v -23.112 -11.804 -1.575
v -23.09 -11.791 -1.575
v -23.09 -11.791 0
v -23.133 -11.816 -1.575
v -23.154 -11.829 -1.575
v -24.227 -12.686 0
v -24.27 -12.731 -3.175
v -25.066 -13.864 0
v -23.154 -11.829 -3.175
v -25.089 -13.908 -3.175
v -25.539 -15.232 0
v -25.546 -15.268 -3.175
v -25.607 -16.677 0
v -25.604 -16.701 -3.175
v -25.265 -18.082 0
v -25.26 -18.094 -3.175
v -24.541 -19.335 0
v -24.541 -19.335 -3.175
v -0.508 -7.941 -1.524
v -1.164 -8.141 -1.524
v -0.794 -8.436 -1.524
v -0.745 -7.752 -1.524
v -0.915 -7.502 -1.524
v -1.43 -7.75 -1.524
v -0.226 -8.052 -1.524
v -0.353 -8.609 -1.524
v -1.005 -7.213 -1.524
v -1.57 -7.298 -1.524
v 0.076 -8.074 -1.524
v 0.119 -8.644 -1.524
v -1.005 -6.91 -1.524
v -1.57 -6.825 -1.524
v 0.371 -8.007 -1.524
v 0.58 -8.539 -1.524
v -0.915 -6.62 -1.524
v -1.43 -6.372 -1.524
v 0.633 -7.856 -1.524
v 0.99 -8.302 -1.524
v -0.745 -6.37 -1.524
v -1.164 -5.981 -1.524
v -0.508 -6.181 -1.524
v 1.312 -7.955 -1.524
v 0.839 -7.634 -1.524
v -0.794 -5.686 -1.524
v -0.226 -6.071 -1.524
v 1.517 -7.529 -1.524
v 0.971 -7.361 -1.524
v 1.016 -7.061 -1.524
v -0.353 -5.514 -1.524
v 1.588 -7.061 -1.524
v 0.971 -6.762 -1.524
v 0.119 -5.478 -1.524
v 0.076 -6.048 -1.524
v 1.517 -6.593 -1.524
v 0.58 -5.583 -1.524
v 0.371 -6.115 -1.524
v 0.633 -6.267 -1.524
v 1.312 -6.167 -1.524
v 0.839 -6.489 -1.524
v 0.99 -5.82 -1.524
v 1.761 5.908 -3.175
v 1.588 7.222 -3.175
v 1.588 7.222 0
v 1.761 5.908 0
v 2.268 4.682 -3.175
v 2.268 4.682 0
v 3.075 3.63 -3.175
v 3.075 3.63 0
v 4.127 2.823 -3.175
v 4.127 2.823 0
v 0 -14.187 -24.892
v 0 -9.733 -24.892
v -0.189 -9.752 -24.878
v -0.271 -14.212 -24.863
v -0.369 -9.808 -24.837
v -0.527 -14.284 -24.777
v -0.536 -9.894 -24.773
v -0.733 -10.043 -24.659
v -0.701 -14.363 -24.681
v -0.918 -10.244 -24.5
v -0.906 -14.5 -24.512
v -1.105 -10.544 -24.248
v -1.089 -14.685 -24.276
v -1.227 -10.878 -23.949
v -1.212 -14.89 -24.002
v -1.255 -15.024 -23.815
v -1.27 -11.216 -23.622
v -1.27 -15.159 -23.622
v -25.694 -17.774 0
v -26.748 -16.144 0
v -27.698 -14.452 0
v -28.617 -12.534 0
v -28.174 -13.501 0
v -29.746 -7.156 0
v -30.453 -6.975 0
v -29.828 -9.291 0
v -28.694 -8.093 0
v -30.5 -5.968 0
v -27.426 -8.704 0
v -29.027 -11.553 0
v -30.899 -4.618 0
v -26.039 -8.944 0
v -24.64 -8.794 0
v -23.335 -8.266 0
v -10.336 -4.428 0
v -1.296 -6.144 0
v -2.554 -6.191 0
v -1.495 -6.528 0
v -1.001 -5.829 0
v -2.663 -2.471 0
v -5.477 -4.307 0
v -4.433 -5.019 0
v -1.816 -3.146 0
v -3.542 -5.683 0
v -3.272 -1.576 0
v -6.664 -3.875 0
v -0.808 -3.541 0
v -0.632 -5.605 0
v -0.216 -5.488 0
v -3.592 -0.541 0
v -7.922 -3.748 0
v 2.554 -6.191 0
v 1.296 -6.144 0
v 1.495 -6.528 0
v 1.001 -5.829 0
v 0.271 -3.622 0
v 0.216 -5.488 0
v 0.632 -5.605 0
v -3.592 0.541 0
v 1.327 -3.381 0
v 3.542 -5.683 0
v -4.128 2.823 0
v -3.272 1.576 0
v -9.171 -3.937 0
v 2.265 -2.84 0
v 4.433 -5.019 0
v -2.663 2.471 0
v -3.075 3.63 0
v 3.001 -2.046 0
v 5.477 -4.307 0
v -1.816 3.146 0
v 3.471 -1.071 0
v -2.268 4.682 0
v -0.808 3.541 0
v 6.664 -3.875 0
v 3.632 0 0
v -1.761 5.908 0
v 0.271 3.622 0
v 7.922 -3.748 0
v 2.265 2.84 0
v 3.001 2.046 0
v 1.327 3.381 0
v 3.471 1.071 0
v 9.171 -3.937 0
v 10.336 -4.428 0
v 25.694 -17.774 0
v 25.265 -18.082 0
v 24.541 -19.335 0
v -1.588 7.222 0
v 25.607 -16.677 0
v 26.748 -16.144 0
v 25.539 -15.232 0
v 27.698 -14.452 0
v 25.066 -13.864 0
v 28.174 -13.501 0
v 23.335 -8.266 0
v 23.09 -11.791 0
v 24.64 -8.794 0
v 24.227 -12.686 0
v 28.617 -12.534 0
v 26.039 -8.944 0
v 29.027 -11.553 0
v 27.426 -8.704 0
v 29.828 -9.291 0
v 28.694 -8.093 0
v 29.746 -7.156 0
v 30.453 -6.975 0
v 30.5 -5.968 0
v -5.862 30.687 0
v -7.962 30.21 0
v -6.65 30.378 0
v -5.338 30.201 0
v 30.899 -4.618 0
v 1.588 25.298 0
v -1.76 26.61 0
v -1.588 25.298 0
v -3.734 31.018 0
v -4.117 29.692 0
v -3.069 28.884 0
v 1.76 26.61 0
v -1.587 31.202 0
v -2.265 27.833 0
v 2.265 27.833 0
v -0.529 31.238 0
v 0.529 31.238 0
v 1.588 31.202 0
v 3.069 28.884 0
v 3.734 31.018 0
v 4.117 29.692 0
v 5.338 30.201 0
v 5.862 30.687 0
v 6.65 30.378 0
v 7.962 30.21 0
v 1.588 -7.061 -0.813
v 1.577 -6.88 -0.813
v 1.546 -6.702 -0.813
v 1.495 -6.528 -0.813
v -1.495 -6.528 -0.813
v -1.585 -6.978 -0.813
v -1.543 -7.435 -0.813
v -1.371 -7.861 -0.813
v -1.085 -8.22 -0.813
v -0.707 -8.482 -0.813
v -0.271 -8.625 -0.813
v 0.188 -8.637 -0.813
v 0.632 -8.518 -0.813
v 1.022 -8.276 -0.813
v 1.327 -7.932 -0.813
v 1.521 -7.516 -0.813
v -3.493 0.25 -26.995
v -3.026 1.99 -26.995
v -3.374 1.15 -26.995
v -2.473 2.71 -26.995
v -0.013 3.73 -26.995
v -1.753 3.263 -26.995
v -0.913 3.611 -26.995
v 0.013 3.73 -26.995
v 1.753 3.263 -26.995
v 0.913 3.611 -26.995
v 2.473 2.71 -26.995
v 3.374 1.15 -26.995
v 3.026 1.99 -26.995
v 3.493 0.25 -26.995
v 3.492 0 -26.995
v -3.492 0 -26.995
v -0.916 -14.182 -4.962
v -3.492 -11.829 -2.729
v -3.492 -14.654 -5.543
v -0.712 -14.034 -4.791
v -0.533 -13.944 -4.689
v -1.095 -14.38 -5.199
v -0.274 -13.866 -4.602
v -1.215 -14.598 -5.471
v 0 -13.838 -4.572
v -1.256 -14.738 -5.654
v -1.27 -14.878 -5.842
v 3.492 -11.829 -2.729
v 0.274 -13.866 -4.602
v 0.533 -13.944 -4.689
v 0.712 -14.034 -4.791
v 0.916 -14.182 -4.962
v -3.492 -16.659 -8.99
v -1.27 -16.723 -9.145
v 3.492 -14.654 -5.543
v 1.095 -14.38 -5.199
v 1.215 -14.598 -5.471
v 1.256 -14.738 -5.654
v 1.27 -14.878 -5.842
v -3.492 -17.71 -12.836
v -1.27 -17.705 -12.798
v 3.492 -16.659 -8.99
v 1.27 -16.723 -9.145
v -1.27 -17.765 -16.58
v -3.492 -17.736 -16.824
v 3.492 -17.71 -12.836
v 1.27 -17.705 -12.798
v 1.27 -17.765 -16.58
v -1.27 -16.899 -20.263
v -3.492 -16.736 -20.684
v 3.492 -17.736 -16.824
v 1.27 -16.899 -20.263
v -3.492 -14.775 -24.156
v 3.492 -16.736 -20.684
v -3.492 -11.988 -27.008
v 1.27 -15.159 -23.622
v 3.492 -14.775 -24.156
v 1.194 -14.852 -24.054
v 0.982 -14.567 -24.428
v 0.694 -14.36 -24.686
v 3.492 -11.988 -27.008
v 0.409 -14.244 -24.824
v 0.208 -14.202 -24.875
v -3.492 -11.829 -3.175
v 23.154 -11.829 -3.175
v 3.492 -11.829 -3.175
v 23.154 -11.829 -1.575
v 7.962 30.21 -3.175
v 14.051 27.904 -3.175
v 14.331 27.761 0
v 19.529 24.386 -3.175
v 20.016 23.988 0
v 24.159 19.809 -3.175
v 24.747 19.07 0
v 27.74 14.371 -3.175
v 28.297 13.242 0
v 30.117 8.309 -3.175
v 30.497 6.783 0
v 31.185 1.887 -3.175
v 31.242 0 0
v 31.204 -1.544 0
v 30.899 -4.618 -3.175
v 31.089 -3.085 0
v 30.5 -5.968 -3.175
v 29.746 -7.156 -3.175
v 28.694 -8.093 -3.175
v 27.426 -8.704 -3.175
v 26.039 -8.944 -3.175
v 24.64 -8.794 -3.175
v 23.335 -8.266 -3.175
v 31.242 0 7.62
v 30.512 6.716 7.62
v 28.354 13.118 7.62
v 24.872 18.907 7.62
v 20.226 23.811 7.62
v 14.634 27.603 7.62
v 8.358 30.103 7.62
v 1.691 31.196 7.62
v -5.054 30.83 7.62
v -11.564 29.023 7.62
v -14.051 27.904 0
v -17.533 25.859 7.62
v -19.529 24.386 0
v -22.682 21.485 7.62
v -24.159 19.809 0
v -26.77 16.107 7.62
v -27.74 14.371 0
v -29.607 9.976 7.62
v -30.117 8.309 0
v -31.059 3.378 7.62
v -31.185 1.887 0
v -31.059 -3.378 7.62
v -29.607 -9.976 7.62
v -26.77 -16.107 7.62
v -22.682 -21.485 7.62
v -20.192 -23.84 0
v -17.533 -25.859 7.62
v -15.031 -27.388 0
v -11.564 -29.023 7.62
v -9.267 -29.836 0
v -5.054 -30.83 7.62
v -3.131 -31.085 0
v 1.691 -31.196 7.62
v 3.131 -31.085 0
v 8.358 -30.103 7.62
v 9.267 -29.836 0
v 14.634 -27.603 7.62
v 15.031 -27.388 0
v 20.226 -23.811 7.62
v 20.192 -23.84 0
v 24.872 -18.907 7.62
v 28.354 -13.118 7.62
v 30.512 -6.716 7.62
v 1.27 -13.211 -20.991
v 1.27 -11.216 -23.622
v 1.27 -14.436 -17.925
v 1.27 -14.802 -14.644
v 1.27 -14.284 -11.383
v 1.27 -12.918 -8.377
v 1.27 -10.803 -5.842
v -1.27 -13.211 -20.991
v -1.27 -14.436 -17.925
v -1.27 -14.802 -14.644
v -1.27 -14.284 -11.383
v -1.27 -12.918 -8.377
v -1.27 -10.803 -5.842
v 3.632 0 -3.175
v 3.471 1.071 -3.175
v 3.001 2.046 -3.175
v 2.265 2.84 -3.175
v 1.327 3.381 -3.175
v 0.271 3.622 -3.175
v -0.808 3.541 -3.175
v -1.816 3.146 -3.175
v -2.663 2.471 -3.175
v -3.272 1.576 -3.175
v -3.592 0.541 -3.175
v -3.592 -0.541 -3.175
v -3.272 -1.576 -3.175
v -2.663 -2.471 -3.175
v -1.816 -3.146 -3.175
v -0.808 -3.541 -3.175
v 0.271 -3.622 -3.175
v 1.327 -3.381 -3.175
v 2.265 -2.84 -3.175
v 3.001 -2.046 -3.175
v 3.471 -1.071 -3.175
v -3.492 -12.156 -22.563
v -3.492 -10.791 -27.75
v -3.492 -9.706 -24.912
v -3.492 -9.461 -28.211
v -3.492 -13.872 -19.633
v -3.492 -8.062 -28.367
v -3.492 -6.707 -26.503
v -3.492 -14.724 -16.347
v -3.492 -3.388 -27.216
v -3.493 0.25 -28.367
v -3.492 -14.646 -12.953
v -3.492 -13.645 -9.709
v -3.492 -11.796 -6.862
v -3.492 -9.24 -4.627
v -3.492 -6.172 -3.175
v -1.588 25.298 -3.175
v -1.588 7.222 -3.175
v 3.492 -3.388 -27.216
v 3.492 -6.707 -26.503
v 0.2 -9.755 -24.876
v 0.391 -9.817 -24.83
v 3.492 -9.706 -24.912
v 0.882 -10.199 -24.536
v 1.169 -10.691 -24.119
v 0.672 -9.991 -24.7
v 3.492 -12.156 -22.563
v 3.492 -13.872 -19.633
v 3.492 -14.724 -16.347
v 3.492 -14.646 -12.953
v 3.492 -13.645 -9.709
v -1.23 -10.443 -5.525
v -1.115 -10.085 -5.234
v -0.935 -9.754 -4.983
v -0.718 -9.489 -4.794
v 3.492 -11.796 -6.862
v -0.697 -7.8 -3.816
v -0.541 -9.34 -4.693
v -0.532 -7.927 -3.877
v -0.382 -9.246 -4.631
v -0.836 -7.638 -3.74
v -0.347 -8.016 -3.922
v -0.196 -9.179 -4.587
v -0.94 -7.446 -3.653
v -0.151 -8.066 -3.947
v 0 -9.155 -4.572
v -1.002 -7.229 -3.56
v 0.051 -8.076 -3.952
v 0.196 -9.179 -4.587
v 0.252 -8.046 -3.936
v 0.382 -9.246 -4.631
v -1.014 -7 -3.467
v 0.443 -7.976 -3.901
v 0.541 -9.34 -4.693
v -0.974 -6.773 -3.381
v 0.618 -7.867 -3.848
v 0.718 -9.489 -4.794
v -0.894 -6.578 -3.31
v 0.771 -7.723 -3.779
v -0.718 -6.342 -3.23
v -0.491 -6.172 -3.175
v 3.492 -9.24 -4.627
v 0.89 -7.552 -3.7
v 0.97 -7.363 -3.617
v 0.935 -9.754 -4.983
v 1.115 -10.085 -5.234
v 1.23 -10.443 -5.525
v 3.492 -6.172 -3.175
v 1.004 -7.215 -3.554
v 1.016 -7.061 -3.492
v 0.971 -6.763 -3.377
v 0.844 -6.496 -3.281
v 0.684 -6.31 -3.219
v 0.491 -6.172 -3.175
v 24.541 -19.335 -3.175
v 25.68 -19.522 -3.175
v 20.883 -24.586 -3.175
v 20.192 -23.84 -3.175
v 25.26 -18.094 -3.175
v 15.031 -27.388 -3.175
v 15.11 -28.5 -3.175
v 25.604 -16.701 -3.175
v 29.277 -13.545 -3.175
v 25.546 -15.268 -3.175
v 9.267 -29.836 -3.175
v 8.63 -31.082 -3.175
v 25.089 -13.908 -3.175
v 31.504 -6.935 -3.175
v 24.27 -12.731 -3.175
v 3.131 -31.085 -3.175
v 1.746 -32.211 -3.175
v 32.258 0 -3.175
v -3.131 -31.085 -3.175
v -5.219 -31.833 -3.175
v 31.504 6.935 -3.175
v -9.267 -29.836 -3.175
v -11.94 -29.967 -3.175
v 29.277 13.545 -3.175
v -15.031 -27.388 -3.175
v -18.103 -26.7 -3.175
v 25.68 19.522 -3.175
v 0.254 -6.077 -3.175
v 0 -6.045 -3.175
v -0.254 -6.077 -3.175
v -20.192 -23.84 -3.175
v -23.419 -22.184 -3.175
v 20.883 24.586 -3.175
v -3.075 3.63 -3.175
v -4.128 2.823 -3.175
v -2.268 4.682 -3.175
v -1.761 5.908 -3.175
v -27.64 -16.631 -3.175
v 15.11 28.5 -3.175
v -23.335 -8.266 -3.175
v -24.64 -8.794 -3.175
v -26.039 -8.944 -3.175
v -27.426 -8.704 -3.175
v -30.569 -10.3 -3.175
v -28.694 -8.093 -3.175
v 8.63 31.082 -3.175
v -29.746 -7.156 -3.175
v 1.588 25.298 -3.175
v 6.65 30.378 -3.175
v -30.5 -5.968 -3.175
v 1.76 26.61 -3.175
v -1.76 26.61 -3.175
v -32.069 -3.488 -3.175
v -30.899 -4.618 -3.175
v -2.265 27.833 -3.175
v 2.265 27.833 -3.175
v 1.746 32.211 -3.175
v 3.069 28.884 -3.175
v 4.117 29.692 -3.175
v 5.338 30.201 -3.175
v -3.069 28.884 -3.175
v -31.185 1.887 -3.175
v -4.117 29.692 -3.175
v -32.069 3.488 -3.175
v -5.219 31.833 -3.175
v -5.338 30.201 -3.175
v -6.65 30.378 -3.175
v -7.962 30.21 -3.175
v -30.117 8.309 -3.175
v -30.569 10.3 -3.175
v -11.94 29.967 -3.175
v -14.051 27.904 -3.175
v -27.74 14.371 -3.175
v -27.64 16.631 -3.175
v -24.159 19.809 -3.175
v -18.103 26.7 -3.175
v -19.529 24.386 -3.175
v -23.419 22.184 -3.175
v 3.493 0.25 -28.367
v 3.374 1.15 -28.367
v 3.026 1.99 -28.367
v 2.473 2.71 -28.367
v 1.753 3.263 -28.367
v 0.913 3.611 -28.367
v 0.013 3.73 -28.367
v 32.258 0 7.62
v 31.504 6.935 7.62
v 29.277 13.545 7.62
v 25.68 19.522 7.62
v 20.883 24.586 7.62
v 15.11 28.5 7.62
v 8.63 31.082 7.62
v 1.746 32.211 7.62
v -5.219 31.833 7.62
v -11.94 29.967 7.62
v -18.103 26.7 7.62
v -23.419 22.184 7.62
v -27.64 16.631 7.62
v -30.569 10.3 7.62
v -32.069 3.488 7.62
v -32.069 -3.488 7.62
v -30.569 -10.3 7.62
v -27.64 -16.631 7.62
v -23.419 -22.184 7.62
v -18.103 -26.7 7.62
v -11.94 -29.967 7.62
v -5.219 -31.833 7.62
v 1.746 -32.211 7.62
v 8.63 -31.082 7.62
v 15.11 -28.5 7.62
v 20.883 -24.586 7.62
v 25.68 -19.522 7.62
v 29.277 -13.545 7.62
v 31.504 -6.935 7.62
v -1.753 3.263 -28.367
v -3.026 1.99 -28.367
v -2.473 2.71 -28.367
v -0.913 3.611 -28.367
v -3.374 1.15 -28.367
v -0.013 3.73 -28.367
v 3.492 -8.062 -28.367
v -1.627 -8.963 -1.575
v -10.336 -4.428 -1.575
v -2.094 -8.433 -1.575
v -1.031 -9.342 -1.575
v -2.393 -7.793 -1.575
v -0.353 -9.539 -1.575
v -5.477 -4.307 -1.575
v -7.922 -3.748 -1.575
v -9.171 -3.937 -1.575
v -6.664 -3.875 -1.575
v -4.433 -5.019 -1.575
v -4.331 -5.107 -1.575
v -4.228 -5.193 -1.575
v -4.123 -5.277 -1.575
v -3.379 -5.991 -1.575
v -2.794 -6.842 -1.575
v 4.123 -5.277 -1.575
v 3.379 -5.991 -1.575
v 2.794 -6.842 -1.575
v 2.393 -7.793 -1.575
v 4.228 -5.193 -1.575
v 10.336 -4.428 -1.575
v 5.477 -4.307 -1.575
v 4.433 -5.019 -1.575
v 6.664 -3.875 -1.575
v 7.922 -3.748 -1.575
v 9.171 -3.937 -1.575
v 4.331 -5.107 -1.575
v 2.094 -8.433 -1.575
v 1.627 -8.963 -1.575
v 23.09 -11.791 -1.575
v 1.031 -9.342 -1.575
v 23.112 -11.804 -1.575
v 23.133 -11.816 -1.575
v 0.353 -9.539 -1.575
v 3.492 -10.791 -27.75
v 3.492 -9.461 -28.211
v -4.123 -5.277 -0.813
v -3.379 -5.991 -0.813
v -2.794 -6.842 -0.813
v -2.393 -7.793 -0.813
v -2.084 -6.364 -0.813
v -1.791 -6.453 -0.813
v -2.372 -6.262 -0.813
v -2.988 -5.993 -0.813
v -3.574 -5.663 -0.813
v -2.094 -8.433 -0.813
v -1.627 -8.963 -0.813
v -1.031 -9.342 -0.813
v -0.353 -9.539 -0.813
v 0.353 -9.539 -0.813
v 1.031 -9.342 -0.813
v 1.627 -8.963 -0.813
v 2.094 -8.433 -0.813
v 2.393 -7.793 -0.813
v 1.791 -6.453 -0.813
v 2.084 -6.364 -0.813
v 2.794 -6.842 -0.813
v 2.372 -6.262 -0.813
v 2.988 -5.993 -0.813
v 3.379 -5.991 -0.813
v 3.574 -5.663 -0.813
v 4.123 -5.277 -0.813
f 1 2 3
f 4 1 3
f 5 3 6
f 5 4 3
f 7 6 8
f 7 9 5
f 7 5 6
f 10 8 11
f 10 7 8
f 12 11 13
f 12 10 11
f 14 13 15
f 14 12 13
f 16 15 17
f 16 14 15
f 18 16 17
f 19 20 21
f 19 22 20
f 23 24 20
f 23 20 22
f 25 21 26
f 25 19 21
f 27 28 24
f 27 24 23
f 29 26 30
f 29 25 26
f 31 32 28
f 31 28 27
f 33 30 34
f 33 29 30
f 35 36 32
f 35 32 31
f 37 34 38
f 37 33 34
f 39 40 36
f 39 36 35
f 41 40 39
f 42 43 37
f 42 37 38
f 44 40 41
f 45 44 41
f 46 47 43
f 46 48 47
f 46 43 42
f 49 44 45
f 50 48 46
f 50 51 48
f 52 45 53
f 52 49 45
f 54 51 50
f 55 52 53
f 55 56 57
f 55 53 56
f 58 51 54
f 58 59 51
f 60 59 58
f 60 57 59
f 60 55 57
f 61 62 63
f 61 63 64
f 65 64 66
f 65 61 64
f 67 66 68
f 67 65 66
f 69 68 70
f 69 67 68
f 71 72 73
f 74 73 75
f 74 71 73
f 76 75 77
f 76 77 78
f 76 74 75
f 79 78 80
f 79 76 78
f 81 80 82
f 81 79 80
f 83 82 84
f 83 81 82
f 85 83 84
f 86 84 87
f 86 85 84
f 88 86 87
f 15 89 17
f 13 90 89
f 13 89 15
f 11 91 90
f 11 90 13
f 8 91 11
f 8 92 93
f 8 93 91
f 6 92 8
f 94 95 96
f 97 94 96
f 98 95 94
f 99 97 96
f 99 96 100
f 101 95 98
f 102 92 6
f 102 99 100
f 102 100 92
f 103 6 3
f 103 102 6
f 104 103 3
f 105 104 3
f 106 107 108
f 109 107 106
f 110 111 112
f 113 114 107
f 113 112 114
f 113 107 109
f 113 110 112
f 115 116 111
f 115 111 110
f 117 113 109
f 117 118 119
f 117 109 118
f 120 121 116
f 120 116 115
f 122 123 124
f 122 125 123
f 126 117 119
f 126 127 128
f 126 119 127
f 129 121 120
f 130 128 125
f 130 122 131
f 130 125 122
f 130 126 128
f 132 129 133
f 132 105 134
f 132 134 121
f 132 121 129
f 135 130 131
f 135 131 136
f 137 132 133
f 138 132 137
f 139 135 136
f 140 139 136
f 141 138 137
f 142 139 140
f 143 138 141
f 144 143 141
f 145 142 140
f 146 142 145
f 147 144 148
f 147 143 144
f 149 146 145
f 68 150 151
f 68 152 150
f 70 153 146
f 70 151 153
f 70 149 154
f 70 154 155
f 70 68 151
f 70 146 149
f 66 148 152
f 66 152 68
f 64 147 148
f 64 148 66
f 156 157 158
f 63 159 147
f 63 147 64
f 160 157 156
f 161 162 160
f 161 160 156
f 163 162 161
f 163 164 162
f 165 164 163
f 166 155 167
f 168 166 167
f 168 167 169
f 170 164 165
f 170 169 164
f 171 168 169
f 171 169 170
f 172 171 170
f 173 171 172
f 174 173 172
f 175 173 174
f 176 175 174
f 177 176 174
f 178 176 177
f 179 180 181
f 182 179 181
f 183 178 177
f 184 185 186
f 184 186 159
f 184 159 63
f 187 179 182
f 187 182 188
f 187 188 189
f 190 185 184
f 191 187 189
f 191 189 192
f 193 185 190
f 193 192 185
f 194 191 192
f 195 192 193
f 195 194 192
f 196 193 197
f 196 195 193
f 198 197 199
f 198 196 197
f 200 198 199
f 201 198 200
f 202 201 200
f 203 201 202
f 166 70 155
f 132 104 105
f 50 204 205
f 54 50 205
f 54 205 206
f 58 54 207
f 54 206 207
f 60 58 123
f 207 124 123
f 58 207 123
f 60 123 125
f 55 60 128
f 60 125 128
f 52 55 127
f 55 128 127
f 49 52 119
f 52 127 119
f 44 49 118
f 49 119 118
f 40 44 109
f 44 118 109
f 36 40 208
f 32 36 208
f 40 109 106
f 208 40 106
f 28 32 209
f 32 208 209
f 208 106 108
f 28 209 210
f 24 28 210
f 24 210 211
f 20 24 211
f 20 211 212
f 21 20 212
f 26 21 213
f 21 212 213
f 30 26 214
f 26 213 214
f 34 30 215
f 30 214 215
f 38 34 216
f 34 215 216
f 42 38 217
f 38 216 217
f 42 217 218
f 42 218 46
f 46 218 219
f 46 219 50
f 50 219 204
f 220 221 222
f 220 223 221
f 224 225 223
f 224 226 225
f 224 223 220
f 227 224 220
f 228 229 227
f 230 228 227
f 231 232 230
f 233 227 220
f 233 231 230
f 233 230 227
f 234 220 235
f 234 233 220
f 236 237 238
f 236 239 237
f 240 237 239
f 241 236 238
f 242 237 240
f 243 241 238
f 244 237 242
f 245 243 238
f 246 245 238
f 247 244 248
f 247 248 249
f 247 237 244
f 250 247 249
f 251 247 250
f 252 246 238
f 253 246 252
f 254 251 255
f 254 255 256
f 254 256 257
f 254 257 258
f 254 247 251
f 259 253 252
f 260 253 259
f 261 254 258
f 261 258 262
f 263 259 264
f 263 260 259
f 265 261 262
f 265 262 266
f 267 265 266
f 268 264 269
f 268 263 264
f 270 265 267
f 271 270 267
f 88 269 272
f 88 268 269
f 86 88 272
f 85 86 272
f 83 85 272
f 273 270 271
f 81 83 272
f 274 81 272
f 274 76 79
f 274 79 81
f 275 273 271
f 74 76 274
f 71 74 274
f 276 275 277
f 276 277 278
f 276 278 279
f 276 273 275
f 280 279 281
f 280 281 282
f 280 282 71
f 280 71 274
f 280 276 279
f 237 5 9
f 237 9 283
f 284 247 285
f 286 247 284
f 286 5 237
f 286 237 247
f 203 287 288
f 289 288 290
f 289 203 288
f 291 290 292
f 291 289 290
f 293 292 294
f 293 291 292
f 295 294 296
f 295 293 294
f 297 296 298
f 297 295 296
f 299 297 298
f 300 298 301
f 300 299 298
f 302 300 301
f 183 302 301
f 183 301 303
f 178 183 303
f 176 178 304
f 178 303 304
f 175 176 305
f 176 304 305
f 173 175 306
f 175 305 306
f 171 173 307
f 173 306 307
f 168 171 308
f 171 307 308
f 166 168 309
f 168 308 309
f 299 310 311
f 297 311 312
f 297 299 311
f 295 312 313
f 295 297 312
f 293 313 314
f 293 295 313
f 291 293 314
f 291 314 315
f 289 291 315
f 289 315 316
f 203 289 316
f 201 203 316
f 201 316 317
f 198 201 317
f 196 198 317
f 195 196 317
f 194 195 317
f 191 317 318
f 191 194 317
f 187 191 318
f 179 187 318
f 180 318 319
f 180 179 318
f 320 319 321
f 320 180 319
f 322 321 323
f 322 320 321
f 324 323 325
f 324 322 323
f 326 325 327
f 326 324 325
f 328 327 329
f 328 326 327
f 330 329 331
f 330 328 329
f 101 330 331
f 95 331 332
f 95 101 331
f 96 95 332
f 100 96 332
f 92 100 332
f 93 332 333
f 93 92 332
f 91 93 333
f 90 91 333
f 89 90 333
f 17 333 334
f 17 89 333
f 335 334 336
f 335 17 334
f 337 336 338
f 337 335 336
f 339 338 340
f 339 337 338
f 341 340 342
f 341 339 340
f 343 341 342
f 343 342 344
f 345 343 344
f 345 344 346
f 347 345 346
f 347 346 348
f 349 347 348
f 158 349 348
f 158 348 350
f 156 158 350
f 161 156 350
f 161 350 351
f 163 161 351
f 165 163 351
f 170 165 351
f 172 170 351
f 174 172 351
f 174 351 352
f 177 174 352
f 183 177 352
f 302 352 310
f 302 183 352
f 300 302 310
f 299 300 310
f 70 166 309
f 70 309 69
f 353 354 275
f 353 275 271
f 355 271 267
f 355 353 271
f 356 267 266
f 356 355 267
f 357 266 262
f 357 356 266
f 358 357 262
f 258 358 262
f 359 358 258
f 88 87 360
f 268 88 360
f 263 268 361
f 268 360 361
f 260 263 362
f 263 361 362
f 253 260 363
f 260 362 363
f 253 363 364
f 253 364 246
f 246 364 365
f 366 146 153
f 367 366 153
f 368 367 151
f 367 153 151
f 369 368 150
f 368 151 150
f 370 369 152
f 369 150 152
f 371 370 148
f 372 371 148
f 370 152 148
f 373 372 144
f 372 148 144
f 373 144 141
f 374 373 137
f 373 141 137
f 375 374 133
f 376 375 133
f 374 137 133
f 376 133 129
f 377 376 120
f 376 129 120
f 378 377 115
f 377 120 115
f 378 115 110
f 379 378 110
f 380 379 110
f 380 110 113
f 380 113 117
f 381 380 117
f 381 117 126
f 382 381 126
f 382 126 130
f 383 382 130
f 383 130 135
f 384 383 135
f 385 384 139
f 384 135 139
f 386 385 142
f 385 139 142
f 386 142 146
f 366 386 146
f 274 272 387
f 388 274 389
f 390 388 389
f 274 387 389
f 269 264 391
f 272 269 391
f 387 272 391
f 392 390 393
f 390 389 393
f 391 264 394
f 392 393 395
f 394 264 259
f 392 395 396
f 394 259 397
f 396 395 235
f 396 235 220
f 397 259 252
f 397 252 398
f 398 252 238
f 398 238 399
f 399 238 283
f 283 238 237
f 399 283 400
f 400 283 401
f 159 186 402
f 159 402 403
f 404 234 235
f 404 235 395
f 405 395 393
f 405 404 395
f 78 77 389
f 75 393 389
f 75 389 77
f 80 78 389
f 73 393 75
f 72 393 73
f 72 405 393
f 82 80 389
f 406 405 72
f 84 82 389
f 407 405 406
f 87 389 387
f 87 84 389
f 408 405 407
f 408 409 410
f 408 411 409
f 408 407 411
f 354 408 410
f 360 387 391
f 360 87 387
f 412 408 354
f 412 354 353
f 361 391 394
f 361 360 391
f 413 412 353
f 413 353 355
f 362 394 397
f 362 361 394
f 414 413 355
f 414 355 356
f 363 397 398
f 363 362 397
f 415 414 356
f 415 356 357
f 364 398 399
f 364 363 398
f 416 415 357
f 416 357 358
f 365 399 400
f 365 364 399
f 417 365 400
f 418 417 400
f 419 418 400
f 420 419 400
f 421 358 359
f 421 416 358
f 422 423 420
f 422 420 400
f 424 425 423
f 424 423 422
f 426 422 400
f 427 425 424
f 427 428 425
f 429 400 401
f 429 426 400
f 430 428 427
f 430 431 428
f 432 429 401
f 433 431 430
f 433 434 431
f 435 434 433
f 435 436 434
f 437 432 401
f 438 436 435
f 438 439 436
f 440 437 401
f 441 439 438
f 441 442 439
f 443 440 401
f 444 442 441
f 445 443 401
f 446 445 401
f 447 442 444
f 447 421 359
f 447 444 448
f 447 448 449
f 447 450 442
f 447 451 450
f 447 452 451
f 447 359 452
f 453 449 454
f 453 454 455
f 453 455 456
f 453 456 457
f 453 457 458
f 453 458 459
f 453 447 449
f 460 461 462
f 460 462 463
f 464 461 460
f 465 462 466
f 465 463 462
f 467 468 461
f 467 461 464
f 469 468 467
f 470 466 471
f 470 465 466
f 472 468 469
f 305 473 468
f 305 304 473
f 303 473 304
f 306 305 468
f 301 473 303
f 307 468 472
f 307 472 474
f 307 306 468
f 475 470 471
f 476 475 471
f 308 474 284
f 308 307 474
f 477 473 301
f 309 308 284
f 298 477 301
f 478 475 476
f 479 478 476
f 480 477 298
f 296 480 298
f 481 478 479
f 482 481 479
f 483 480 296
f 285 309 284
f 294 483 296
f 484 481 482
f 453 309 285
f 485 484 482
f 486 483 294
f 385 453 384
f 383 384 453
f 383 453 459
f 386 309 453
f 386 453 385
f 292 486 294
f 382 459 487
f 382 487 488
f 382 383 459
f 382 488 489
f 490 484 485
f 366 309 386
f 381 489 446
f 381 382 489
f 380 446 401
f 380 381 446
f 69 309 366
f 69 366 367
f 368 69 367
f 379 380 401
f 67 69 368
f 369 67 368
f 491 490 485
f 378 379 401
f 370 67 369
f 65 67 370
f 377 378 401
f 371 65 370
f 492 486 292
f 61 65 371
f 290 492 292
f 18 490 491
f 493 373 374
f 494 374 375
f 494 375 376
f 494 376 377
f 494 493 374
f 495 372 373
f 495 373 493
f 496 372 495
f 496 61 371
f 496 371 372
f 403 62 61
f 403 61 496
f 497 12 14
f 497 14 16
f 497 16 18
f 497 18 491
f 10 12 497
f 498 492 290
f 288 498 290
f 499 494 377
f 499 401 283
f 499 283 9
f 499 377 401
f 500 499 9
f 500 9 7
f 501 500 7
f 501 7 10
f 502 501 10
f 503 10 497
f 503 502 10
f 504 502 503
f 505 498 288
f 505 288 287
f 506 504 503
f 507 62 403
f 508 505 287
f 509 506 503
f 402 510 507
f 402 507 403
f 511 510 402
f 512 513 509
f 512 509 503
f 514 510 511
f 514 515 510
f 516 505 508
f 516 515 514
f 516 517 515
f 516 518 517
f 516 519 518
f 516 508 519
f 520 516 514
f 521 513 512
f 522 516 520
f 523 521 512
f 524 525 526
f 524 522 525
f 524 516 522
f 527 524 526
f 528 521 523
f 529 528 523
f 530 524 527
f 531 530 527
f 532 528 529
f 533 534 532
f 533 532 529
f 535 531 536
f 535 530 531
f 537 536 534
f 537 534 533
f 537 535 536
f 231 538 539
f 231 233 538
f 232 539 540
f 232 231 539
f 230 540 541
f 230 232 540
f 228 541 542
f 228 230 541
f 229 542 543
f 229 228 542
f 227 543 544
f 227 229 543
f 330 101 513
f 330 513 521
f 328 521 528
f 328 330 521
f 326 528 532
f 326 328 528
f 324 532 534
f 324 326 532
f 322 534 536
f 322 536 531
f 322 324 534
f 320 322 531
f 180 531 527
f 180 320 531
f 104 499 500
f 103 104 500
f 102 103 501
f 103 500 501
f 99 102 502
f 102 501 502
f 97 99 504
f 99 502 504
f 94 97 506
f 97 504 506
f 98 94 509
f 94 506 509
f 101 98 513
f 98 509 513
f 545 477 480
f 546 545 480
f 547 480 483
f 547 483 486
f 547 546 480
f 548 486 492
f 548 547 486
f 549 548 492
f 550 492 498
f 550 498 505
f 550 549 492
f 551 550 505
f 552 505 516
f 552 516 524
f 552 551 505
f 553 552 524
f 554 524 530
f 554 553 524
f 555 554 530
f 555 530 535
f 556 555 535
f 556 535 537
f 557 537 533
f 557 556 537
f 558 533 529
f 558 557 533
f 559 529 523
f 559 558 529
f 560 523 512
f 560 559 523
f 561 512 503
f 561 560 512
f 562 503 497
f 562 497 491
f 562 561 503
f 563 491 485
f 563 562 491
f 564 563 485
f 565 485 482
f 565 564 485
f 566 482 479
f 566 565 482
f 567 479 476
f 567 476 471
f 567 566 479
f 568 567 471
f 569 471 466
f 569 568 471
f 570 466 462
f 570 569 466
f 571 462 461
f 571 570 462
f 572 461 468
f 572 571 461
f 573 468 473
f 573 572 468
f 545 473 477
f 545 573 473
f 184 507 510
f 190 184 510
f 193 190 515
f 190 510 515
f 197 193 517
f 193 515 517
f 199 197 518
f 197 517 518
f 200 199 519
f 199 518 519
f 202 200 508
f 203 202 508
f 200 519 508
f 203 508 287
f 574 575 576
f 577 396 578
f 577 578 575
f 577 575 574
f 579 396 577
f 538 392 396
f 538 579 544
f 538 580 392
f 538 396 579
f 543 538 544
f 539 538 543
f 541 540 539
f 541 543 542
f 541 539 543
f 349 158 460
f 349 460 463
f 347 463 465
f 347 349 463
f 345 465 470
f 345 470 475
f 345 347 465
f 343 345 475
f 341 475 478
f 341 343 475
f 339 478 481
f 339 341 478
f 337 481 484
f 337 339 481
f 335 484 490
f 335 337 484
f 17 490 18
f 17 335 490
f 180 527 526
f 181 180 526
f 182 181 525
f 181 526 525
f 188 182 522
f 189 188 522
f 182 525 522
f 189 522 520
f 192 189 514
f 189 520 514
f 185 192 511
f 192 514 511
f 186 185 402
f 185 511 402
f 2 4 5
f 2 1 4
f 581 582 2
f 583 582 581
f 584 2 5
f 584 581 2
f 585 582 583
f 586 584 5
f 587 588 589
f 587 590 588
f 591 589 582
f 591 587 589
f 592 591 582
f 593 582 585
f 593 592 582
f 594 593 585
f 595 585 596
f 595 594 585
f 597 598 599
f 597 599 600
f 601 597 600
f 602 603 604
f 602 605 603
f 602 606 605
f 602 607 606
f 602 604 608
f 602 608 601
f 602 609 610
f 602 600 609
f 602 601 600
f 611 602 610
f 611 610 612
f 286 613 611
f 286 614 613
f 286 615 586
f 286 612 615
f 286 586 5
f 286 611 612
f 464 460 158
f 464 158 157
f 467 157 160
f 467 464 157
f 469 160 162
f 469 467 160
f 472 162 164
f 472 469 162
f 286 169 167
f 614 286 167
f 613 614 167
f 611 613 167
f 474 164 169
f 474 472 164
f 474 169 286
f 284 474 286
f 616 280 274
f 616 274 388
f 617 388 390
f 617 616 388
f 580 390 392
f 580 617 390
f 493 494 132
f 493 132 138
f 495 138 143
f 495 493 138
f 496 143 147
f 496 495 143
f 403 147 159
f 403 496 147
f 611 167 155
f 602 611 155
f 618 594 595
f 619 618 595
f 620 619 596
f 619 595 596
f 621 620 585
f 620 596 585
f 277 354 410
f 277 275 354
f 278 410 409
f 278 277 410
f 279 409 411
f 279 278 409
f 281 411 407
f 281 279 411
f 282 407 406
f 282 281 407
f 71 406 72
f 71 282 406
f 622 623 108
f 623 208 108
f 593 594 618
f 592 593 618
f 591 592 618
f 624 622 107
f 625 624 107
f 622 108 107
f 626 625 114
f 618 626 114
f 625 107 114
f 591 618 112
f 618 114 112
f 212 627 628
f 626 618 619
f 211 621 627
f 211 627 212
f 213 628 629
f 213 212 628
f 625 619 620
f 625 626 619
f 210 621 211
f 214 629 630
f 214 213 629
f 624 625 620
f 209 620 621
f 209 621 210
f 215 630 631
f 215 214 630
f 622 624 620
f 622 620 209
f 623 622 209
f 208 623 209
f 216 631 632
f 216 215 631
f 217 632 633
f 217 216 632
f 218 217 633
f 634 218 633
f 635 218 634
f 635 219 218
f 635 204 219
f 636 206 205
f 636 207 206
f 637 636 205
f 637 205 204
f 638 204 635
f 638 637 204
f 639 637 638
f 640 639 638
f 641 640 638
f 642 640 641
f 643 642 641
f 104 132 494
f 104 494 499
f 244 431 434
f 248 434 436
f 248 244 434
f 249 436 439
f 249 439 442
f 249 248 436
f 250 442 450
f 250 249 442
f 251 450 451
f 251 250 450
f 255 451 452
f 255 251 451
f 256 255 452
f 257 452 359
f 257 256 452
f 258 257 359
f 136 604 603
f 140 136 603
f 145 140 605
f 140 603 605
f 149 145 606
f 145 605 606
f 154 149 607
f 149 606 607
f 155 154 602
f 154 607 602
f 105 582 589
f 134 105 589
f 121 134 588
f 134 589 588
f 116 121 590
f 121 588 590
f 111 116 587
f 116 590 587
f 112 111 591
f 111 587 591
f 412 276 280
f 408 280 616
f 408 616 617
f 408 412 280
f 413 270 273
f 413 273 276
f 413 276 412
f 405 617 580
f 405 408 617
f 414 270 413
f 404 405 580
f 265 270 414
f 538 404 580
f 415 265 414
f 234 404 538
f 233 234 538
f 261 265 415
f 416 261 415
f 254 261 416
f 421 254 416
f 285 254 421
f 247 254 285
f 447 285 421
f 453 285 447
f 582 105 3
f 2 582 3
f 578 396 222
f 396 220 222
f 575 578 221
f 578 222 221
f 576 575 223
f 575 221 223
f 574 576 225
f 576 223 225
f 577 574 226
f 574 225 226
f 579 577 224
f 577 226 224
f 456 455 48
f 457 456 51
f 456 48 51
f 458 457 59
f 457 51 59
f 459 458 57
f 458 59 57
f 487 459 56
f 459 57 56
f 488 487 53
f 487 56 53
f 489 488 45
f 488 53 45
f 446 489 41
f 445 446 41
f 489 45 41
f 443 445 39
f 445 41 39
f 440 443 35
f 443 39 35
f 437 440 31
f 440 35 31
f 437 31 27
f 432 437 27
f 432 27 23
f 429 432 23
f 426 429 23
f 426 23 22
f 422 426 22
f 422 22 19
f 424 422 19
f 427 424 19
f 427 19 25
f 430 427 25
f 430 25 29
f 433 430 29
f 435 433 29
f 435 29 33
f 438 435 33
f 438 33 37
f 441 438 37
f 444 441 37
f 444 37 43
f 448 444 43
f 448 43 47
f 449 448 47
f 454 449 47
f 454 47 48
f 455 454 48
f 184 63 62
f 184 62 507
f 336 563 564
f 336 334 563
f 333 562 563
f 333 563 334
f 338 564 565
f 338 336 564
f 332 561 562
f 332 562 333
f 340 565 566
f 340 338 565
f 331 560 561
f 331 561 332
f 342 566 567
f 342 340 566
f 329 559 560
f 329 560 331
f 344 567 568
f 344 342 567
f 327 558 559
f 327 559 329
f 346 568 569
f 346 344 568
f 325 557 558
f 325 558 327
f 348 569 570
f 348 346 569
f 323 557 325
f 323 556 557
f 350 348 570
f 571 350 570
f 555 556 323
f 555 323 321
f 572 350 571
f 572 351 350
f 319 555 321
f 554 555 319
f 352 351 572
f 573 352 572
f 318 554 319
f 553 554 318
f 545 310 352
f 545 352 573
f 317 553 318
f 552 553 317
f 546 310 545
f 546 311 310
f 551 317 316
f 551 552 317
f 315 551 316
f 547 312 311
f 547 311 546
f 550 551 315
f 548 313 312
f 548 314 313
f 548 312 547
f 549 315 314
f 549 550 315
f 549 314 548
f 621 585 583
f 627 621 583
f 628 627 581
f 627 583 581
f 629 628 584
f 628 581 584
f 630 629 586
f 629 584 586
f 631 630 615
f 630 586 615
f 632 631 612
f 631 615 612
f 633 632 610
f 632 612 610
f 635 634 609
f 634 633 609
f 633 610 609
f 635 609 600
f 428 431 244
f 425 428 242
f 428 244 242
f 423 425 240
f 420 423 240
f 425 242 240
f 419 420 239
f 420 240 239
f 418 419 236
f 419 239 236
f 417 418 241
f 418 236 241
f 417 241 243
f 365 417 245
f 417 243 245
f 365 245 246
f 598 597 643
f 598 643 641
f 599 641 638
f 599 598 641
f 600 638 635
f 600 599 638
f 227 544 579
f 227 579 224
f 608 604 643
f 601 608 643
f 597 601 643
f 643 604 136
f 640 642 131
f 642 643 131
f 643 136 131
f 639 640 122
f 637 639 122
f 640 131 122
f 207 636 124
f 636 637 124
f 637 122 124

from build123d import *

# Parameters (mm, degrees)
F0_R         = 32.258
F0_R_2       = 3.6322
F1_DEPTH     = 3.175
F4_DEPTH     = 3.4925
F5_W         = 2.54
F5_H         = 20.32
F6_DEPTH     = 25.4
F7_R         = 1.26999
F8_R         = 3.4798
F9_R         = 32.258
F9_R_2       = 31.242
F10_DEPTH    = 7.62
F12_DEPTH    = 1.5748
F13_T1_DEPTH = 3.175
F13_T3_DEPTH = 1.5748
F14_R        = 2.5029708097
F15_DEPTH    = 0.762
F16_T1_DEPTH = 0.762
F17_R        = 1.016
F18_DEPTH    = 25.4
F19_R        = 1.5875
F20_DEPTH    = 1.524


# Not quite as in the source:
# - a fillet or chamfer that OpenCascade refuses, or shapes differently, is made with other operations: its cross-section is extruded or revolved along the edge and cut away or added
# - a fillet or chamfer is up to 0.001 mm smaller than in the source, because OpenCascade refuses the exact size


with BuildPart() as f1:
    # F0 (on Top) → F1 (new body)
    with BuildSketch(Plane.XY):
        Circle(F0_R)
        with BuildLine():
            ThreePointArc((27.6984583499, -14.4519192165), (0, -31.242), (-27.6984583499, -14.4519192165))
            Line((-27.6984583499, -14.4519192165), (-23.1550479516, -11.82878))
            Line((-23.1550479516, -11.82878), (23.1550479516, -11.82878))
            Line((23.1550479516, -11.82878), (27.6984583499, -14.4519192165))
        make_face(mode=Mode.SUBTRACT)
        with BuildLine():
            ThreePointArc((-1.5875, 4.2197649224), (-1.9273330318, 4.0757771817), (-2.25425, 3.904475533))
            Line((-2.25425, 3.904475533), (-29.0274080844, -11.5530144941))
            ThreePointArc((-29.0274080844, -11.5530144941), (-26.2927422142, 16.8746635777), (-1.5875, 31.2016411067))
            Line((-1.5875, 31.2016411067), (-1.5875, 4.2197649224))
        make_face(mode=Mode.SUBTRACT)
        Circle(F0_R_2, mode=Mode.SUBTRACT)
        with BuildLine():
            Line((29.0274080844, -11.5530144941), (2.25425, 3.904475533))
            ThreePointArc((2.25425, 3.904475533), (1.9273330318, 4.0757771817), (1.5875, 4.2197649224))
            Line((1.5875, 4.2197649224), (1.5875, 31.2016411067))
            ThreePointArc((1.5875, 31.2016411067), (26.2927422142, 16.8746635777), (29.0274080844, -11.5530144941))
        make_face(mode=Mode.SUBTRACT)
    extrude(amount=-F1_DEPTH)

    # F3 (on offset) → F4 (join, symmetric)
    with BuildSketch(Plane.YZ):
        with BuildLine():
            ThreePointArc((0, -26.9952715967), (-14.4117945702, -18.019693004), (-6.1718963048, -3.175))
            Line((-6.1718963048, -3.175), (-6.1718963048, -2.7284894604))
            Line((-6.1718963048, -2.7284894604), (-11.8285217471, -2.7284894604))
            ThreePointArc((-11.8285217471, -2.7284894604), (-17.8532575218, -14.8291637745), (-11.9875892757, -27.0077390621))
            ThreePointArc((-11.9875892757, -27.0077390621), (-10.1388723772, -28.0174760831), (-8.0615554064, -28.3668715967))
            Line((-8.0615554064, -28.3668715967), (3.7295622751, -28.3668715967))
            Line((3.7295622751, -28.3668715967), (3.7295622751, -26.9952715967))
            Line((3.7295622751, -26.9952715967), (0, -26.9952715967))
        make_face()
    extrude(amount=F4_DEPTH, both=True)

    # F5 (on Front) → F6 (cut)
    with BuildSketch(Plane.XZ):
        with Locations((0, -14.732)):
            Rectangle(F5_W, F5_H)
    extrude(amount=F6_DEPTH, mode=Mode.SUBTRACT)

    # F7 (radius 1.27 in the source; OpenCascade refuses exactly that, so slightly less here)
    f7_edges = [f1.edges().sort_by_distance(p)[0] for p in [
        (1.27, -11.496811, -4.572),
        (-1.27, -11.496811, -4.572),
        (1.27, -11.960099, -24.892),
        (-1.27, -11.960099, -24.892),
    ]]
    fillet(f7_edges, radius=F7_R)

    # F8
    f8_edges = [f1.edges().sort_by_distance(p)[0] for p in [
        (-3.4925, 3.729562, -27.681072),
        (3.4925, 3.729562, -27.681072),
    ]]
    fillet(f8_edges, radius=F8_R)

    # F9 (on face) → F10 (join)
    with BuildSketch(Plane.XY):
        Circle(F9_R)
        Circle(F9_R_2, mode=Mode.SUBTRACT)
    extrude(amount=F10_DEPTH)

    # F11 (on face) → F12 (cut)
    with BuildSketch(Plane.XY):
        with BuildLine():
            Line((-6.35, -2.1263810414), (-23.1550479516, -11.82878))
            Line((-23.1550479516, -11.82878), (-23.1550479516, -13.7292239815))
            Line((-23.1550479516, -13.7292239815), (23.1550479516, -13.8936461881))
            Line((23.1550479516, -13.8936461881), (23.1550479516, -11.82878))
            Line((23.1550479516, -11.82878), (6.35, -2.1263810414))
            ThreePointArc((6.35, -2.1263810414), (0, -6.6965660105), (-6.35, -2.1263810414))
        make_face()
    extrude(amount=-F12_DEPTH, mode=Mode.SUBTRACT)

    # F13: fillet of radius 5.08 on 10 edges, made by hand

    # F13_s2 → F13_t1 (join)
    with BuildSketch(Plane.XY.offset(-3.175)):
        with BuildLine():
            ThreePointArc((1.5875, 7.2223631924), (2.2680909488, 4.6823631924), (4.1275, 2.8229541412))
            Line((4.1275, 2.8229541412), (3.8735, 2.3830132361))
            ThreePointArc((3.8735, 2.3830132361), (2.00025, 3.4645346278), (1.4086267606, 3.7442984522))
            Line((1.4086267606, 3.7442984522), (1.0795, 4.2197649224))
            Line((1.0795, 4.2197649224), (1.0795, 7.2223631924))
            Line((1.0795, 7.2223631924), (1.5875, 7.2223631924))
        make_face()
        with BuildLine():
            ThreePointArc((-4.1275, 2.8229541412), (-2.2680909488, 4.6823631924), (-1.5875, 7.2223631924))
            Line((-1.5875, 7.2223631924), (-1.0795, 7.2223631924))
            Line((-1.0795, 7.2223631924), (-1.0795, 4.2197649224))
            Line((-1.0795, 4.2197649224), (-1.4086267606, 3.7442984522))
            ThreePointArc((-1.4086267606, 3.7442984522), (-2.00025, 3.4645346278), (-3.8735, 2.3830132361))
            Line((-3.8735, 2.3830132361), (-4.1275, 2.8229541412))
        make_face()
        with BuildLine():
            ThreePointArc((1.5875, 25.2981162886), (3.5667318521, 29.3219995987), (7.9621601942, 30.2103718786))
            ThreePointArc((7.9621601942, 30.2103718786), (4.8004849887, 30.870988126), (1.5875, 31.2016411067))
            Line((1.5875, 31.2016411067), (1.5875, 25.2981162886))
        make_face()
        with BuildLine():
            ThreePointArc((-7.9621601942, 30.2103718786), (-3.5667318521, 29.3219995987), (-1.5875, 25.2981162886))
            Line((-1.5875, 25.2981162886), (-1.5875, 31.2016411067))
            ThreePointArc((-1.5875, 31.2016411067), (-4.8004849887, 30.870988126), (-7.9621601942, 30.2103718786))
        make_face()
        with BuildLine():
            ThreePointArc((-23.0901860951, -11.7913319897), (-25.5388151591, -15.2315851298), (-24.5405134922, -19.3345742528))
            ThreePointArc((-24.5405134922, -19.3345742528), (-26.2333304182, -16.9668777083), (-27.6984583499, -14.4519192165))
            Line((-27.6984583499, -14.4519192165), (-23.0901860951, -11.7913319897))
        make_face()
        with BuildLine():
            ThreePointArc((-23.3346480943, -8.2662979814), (-28.0816389218, -8.4424316835), (-30.8988516077, -4.6177411496))
            ThreePointArc((-30.8988516077, -4.6177411496), (-30.1631174493, -8.1393433235), (-29.0274080844, -11.5530144941))
            Line((-29.0274080844, -11.5530144941), (-23.3346480943, -8.2662979814))
        make_face()
        with BuildLine():
            ThreePointArc((24.5405134922, -19.3345742528), (25.5388151591, -15.2315851298), (23.0901860951, -11.7913319897))
            Line((23.0901860951, -11.7913319897), (27.6984583499, -14.4519192165))
            ThreePointArc((27.6984583499, -14.4519192165), (26.2333304182, -16.9668777083), (24.5405134922, -19.3345742528))
        make_face()
        with BuildLine():
            ThreePointArc((30.8988516077, -4.6177411496), (28.0816389218, -8.4424316835), (23.3346480943, -8.2662979814))
            Line((23.3346480943, -8.2662979814), (29.0274080844, -11.5530144941))
            ThreePointArc((29.0274080844, -11.5530144941), (30.1631174493, -8.1393433235), (30.8988516077, -4.6177411496))
        make_face()
    extrude(amount=F13_T1_DEPTH)

    # F13_s4 → F13_t3 (join)
    with BuildSketch(Plane.XY.offset(-1.5748)):
        with BuildLine():
            ThreePointArc((4.4329020877, -5.0193002913), (7.2889409664, -3.7722686868), (10.3356916982, -4.4275212163))
            Line((10.3356916982, -4.4275212163), (6.35, -2.1263810414))
            ThreePointArc((6.35, -2.1263810414), (5.5821133816, -3.6991899827), (4.4329020877, -5.0193002913))
        make_face()
        with BuildLine():
            ThreePointArc((-10.3356916982, -4.4275212163), (-7.2889409664, -3.7722686868), (-4.4329020877, -5.0193002913))
            ThreePointArc((-4.4329020877, -5.0193002913), (-5.5821133816, -3.6991899827), (-6.35, -2.1263810414))
            Line((-6.35, -2.1263810414), (-10.3356916982, -4.4275212163))
        make_face()
    extrude(amount=F13_T3_DEPTH)

    # F14 (on face) → F15 (join)
    with BuildSketch(Plane.XY.offset(-1.5748)):
        with Locations((0, -7.0612)):
            Circle(F14_R)
    extrude(amount=F15_DEPTH)

    # F16: fillet of radius 5.08 on 2 edges, made by hand

    # F16_s2 → F16_t1 (join)
    with BuildSketch(Plane.XY.offset(-1.5748)):
        with BuildLine():
            ThreePointArc((-4.123339334, -5.2765584494), (-3.0648098759, -6.4018902356), (-2.3934920763, -7.7933601976))
            ThreePointArc((-2.3934920763, -7.7933601976), (-2.5027259003, -7.02618654), (-2.3720733098, -6.2623689245))
            ThreePointArc((-2.3720733098, -6.2623689245), (-3.2848975519, -5.8355329154), (-4.123339334, -5.2765584494))
        make_face()
        with BuildLine():
            ThreePointArc((4.123339334, -5.2765584494), (3.0648098759, -6.4018902356), (2.3934920763, -7.7933601976))
            ThreePointArc((2.3934920763, -7.7933601976), (2.5027259003, -7.02618654), (2.3720733098, -6.2623689245))
            ThreePointArc((2.3720733098, -6.2623689245), (3.2848975519, -5.8355329154), (4.123339334, -5.2765584494))
        make_face()
    extrude(amount=F16_T1_DEPTH)

    # F17 (on face) → F18 (cut)
    with BuildSketch(Plane.XY):
        with Locations((0, -7.0612)):
            Circle(F17_R)
    extrude(amount=-F18_DEPTH, mode=Mode.SUBTRACT)

    # F19 (on face) → F20 (cut)
    with BuildSketch(Plane.XY):
        with Locations((0, -7.0612)):
            Circle(F19_R)
    extrude(amount=-F20_DEPTH, mode=Mode.SUBTRACT)


solid = f1.part
